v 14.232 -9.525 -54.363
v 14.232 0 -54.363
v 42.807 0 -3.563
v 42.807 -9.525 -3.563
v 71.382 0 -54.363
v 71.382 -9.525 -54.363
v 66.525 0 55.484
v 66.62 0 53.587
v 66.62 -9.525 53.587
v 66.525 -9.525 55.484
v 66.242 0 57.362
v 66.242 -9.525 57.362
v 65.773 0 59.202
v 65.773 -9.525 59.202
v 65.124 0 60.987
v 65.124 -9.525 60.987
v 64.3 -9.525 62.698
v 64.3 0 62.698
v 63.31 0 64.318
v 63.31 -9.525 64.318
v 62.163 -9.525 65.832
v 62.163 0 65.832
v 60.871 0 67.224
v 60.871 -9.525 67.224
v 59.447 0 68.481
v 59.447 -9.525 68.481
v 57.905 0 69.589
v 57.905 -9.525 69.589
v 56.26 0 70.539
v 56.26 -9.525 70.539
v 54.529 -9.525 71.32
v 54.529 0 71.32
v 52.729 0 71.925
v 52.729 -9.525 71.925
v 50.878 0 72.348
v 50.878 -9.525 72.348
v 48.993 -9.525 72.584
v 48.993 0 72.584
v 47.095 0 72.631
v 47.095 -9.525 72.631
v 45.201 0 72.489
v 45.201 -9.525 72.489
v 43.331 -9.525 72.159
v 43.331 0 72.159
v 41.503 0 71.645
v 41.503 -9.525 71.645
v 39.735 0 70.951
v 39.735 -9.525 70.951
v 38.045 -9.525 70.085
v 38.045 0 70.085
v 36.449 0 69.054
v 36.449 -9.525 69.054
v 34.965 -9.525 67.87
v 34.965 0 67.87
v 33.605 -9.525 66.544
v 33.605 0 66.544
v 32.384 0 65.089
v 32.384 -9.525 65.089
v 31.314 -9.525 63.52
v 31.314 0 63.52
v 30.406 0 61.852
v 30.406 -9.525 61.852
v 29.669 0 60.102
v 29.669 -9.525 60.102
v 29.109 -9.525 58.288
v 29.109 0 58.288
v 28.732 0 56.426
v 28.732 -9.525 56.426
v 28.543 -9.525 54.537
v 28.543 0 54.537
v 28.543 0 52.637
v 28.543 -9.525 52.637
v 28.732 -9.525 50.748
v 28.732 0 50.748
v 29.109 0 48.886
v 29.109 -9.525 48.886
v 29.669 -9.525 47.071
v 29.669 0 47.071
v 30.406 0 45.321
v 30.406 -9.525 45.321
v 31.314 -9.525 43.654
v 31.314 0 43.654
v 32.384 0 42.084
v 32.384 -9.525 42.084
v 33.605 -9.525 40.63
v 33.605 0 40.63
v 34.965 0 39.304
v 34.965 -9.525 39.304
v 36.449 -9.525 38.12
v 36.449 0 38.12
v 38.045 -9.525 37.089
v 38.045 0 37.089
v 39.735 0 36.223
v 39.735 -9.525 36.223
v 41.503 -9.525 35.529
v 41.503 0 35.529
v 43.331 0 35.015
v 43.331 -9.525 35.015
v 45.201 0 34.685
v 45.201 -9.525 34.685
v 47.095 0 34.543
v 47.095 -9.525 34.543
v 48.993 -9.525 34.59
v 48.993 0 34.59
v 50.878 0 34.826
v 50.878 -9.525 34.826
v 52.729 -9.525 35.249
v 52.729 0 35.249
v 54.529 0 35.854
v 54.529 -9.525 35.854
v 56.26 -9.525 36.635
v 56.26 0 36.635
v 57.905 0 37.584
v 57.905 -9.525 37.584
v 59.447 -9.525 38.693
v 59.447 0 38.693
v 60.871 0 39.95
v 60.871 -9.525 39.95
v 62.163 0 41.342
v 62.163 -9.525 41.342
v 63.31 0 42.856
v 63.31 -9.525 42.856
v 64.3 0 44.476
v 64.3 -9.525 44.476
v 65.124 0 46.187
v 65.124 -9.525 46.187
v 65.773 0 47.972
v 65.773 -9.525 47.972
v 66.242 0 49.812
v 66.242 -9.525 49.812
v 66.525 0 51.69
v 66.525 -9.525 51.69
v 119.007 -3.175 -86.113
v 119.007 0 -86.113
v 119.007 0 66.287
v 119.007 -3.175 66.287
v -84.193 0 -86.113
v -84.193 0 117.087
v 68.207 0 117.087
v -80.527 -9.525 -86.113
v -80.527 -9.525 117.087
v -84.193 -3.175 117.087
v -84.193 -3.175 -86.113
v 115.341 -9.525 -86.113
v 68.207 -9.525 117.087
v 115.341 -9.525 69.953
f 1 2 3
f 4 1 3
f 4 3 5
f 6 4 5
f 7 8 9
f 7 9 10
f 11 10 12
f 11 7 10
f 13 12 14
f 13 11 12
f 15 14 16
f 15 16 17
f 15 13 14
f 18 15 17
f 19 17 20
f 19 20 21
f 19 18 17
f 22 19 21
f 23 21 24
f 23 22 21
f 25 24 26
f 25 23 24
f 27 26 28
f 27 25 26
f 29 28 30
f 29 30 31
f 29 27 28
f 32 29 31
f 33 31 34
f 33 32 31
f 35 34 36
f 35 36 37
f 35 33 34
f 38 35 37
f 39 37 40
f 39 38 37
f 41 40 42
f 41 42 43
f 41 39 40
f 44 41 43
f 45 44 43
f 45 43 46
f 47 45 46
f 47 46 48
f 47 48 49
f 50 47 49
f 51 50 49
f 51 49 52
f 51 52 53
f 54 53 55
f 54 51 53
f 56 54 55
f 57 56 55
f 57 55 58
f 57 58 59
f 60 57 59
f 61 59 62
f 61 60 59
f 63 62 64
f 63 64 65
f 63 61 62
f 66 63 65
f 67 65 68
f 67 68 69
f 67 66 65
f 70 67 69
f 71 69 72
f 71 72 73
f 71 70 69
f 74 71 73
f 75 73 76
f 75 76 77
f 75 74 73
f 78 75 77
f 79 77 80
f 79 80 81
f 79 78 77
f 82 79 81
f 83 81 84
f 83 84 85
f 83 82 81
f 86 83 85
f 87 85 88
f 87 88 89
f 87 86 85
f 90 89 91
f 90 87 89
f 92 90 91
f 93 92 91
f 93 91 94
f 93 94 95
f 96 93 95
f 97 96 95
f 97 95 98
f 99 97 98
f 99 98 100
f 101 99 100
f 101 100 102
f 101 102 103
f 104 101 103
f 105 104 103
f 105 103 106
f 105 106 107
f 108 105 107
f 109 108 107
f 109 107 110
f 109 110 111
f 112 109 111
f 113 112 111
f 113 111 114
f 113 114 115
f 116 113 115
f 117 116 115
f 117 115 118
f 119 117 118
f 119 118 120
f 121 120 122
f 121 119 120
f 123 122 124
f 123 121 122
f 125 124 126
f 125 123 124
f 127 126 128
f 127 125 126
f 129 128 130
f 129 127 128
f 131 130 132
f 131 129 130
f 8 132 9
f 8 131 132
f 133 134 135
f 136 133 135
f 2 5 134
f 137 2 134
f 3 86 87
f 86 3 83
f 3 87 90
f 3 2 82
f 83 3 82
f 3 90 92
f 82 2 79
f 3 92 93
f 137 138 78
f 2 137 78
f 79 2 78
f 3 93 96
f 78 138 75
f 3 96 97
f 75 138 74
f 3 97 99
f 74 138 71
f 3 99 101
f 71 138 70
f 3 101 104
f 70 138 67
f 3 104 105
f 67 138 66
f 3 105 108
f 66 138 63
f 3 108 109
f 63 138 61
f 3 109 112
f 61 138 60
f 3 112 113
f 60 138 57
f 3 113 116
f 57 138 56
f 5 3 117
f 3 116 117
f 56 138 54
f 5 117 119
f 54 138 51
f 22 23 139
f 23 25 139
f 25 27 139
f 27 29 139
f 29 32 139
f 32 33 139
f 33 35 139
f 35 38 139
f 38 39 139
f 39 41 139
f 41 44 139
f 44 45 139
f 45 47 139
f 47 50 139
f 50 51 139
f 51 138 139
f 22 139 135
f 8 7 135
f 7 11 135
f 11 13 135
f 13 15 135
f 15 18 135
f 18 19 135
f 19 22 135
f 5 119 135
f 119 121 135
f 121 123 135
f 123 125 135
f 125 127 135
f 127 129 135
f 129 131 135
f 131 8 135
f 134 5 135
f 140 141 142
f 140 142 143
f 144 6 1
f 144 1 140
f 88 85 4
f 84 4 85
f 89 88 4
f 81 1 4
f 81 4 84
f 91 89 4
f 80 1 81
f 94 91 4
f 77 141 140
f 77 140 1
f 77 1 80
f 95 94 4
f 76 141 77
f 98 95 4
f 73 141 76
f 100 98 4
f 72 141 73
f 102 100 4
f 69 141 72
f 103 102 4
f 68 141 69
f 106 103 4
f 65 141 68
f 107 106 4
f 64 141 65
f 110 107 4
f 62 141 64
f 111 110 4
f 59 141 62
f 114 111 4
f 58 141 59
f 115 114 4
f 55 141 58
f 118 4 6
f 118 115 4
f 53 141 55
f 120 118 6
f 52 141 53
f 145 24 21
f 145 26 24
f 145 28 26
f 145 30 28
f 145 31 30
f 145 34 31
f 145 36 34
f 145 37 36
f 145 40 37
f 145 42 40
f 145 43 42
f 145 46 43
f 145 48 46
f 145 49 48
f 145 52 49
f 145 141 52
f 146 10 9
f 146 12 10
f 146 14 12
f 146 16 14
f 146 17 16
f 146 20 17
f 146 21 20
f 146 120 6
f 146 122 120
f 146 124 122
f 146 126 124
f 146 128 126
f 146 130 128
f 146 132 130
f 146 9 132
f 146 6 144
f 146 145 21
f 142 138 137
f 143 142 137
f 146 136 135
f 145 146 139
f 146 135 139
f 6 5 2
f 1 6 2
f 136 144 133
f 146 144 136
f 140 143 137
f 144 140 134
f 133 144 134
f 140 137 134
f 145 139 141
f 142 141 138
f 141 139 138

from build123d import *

# Parameters (mm, degrees)
F0_R     = 19.05
F1_DEPTH = 9.525
F2_SIZE2 = 3.6661742094
F2_SIZE  = 6.35
F3_SIZE2 = 3.6661742094
F3_SIZE  = 6.35


# Not quite as in the source:
# - a length typed as a fraction of an inch, garbled in the dataset ("3 / 203.2 mm" for 3/8 in), is restored


with BuildPart() as f1:
    # F0 (on Front) → F1 (new body)
    with BuildSketch(Plane.XZ):
        Polygon((68.2071738782, 117.0869429827), (-84.1928261218, 117.0869429827), (-84.1928261218, -86.1130570173), (119.0071738782, -86.1130570173), (119.0071738782, 66.2869429827), align=None)
        Polygon((14.2321738782, -54.3630570173), (42.8071738782, -3.5630570173), (71.3821738782, -54.3630570173), align=None, mode=Mode.SUBTRACT)
        with Locations((47.5696738782, 53.5869429827)):
            Circle(F0_R, mode=Mode.SUBTRACT)
    extrude(amount=F1_DEPTH)

    # F2
    f2_edges = [f1.edges().sort_by_distance(p)[0] for p in [
        (119.007174, -9.525, -9.913057),
    ]]
    f2_side = f1.faces().sort_by_distance((119.007174, -4.7625, -9.913057))[0]
    chamfer(f2_edges, length=F2_SIZE, length2=F2_SIZE2, reference=f2_side)

    # F3
    f3_edges = [f1.edges().sort_by_distance(p)[0] for p in [
        (-84.192826, -9.525, 15.486943),
    ]]
    f3_side = f1.faces().sort_by_distance((-84.192826, -4.7625, 15.486943))[0]
    chamfer(f3_edges, length=F3_SIZE, length2=F3_SIZE2, reference=f3_side)


solid = f1.part
